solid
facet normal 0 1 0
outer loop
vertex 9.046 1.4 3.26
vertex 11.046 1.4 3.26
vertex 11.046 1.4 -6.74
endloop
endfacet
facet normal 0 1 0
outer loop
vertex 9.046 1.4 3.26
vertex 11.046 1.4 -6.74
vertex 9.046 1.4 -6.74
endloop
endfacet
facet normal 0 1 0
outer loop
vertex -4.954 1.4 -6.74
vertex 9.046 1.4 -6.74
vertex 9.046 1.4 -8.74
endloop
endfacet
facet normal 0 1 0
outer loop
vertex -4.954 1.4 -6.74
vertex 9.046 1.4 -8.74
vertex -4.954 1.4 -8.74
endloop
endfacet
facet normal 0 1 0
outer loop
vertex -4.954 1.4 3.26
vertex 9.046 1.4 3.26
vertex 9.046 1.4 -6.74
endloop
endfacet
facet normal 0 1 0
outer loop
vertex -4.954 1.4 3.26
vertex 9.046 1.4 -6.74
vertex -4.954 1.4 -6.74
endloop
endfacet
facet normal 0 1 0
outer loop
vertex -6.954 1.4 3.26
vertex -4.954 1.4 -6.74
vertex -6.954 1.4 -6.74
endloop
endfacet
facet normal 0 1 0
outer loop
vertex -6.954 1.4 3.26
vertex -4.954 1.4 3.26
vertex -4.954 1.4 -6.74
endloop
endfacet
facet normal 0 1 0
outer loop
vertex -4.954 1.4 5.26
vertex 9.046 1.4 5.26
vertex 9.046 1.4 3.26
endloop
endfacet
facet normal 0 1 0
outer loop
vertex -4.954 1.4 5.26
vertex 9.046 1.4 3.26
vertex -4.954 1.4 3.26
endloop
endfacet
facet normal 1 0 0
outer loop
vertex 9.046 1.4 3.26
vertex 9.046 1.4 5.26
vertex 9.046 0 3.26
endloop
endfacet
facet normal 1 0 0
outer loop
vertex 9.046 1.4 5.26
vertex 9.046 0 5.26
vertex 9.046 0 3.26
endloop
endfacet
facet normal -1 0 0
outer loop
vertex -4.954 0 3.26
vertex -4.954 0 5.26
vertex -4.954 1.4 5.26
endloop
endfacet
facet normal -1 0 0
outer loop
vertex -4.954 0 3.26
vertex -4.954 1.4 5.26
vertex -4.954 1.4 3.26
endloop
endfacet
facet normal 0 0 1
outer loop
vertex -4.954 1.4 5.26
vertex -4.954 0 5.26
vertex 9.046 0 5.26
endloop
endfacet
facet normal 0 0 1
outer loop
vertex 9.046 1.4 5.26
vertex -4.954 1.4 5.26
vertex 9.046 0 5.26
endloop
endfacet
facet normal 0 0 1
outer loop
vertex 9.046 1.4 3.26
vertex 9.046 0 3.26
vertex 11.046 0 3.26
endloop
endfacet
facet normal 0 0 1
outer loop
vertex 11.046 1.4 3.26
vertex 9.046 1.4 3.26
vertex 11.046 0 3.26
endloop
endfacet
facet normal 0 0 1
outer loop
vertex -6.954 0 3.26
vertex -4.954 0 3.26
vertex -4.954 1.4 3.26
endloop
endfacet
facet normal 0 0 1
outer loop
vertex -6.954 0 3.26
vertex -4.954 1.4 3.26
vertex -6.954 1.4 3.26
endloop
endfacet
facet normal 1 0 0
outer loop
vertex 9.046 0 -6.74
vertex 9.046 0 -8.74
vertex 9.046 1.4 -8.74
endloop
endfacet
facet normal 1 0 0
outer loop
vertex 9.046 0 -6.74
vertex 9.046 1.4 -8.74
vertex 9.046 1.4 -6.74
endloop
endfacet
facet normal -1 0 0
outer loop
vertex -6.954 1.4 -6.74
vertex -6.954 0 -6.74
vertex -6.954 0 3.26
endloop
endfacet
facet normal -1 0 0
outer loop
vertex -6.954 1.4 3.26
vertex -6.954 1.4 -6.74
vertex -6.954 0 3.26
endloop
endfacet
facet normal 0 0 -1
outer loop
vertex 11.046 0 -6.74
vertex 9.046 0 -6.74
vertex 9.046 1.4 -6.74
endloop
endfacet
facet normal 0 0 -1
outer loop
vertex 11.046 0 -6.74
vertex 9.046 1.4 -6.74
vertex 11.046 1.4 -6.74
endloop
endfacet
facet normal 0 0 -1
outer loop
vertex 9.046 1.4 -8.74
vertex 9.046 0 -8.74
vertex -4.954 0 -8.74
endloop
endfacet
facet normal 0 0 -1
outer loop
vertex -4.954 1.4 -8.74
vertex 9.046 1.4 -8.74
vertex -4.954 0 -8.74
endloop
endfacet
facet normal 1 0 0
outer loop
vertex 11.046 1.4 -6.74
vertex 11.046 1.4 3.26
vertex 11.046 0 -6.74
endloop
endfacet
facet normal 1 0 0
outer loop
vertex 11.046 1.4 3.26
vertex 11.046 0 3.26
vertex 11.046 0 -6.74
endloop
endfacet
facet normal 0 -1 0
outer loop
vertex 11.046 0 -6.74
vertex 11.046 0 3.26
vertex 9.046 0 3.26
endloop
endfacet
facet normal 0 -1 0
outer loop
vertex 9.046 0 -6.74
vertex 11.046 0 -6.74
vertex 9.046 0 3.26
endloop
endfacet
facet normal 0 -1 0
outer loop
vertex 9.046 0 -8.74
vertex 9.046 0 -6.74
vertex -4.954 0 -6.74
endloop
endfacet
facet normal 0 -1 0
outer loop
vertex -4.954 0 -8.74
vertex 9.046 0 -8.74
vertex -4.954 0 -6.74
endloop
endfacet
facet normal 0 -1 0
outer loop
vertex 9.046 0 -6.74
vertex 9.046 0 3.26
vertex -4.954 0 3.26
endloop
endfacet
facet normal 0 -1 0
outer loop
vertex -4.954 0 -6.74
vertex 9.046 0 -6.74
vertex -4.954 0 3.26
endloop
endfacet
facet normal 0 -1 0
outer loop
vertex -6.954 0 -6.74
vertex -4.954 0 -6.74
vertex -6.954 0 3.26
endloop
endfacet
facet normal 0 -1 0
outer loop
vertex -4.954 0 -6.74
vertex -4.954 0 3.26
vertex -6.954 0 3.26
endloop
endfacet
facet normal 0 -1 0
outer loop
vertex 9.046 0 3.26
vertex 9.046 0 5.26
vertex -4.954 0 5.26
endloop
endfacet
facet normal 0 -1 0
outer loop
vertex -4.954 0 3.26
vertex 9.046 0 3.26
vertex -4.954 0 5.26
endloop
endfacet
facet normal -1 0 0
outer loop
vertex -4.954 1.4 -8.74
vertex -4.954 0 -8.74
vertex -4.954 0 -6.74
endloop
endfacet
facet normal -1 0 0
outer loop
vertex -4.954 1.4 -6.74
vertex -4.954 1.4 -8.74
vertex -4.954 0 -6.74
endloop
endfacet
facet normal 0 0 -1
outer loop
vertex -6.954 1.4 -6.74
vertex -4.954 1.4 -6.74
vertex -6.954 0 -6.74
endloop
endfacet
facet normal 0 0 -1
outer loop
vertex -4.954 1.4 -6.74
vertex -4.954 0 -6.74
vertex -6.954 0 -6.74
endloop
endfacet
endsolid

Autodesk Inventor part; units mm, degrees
ref_plane "YZ Plane" through (0, 0, 0) normal (1, 0, 0) x (0, 1, 0)
ref_plane "XZ Plane" through (0, 0, 0) normal (0, 1, 0) x (-1, 0, 0)
ref_plane "XY Plane" through (0, 0, 0) normal (0, 0, 1) x (1, 0, 0)
sketch "Esquisse1" plane through (0, 0, 0) normal (0, 1, 0) x (-1, 0, 0)
  line L0 (4.9536, 5.2597) -> (4.9536, 3.2597)
  line L1 (4.9536, 3.2597) -> (6.9536, 3.2597)
  line L2 (-9.0464, 5.2597) -> (-9.0464, 3.2597)
  line L3 (-9.0464, 3.2597) -> (-11.0464, 3.2597)
  line L4 (-9.0464, -8.7403) -> (-9.0464, -6.7403)
  line L5 (-9.0464, -6.7403) -> (-11.0464, -6.7403)
  line L6 (4.9536, -8.7403) -> (4.9536, -6.7403)
  line L7 (4.9536, -6.7403) -> (6.9536, -6.7403)
  line L8 (4.9536, 5.2597) -> (-9.0464, 5.2597)
  line L9 (-11.0464, 3.2597) -> (-11.0464, -6.7403)
  line L10 (-9.0464, -8.7403) -> (4.9536, -8.7403)
  line L11 (6.9536, -6.7403) -> (6.9536, 3.2597)
  point P0 (0, 0)
  dimension "d2" = 2
  dimension "d3" = 2
  dimension "d4" = 2
  dimension "d5" = 2
  dimension "d6" = 2
  dimension "d7" = 2
  dimension "d8" = 2
  dimension "d9" = 2
  dimension "d16" = 10
  dimension "d17" = 18
extrude "Extrusion1" add sketch "Esquisse1" along normal blind 1.4
properties part number "pcb"
